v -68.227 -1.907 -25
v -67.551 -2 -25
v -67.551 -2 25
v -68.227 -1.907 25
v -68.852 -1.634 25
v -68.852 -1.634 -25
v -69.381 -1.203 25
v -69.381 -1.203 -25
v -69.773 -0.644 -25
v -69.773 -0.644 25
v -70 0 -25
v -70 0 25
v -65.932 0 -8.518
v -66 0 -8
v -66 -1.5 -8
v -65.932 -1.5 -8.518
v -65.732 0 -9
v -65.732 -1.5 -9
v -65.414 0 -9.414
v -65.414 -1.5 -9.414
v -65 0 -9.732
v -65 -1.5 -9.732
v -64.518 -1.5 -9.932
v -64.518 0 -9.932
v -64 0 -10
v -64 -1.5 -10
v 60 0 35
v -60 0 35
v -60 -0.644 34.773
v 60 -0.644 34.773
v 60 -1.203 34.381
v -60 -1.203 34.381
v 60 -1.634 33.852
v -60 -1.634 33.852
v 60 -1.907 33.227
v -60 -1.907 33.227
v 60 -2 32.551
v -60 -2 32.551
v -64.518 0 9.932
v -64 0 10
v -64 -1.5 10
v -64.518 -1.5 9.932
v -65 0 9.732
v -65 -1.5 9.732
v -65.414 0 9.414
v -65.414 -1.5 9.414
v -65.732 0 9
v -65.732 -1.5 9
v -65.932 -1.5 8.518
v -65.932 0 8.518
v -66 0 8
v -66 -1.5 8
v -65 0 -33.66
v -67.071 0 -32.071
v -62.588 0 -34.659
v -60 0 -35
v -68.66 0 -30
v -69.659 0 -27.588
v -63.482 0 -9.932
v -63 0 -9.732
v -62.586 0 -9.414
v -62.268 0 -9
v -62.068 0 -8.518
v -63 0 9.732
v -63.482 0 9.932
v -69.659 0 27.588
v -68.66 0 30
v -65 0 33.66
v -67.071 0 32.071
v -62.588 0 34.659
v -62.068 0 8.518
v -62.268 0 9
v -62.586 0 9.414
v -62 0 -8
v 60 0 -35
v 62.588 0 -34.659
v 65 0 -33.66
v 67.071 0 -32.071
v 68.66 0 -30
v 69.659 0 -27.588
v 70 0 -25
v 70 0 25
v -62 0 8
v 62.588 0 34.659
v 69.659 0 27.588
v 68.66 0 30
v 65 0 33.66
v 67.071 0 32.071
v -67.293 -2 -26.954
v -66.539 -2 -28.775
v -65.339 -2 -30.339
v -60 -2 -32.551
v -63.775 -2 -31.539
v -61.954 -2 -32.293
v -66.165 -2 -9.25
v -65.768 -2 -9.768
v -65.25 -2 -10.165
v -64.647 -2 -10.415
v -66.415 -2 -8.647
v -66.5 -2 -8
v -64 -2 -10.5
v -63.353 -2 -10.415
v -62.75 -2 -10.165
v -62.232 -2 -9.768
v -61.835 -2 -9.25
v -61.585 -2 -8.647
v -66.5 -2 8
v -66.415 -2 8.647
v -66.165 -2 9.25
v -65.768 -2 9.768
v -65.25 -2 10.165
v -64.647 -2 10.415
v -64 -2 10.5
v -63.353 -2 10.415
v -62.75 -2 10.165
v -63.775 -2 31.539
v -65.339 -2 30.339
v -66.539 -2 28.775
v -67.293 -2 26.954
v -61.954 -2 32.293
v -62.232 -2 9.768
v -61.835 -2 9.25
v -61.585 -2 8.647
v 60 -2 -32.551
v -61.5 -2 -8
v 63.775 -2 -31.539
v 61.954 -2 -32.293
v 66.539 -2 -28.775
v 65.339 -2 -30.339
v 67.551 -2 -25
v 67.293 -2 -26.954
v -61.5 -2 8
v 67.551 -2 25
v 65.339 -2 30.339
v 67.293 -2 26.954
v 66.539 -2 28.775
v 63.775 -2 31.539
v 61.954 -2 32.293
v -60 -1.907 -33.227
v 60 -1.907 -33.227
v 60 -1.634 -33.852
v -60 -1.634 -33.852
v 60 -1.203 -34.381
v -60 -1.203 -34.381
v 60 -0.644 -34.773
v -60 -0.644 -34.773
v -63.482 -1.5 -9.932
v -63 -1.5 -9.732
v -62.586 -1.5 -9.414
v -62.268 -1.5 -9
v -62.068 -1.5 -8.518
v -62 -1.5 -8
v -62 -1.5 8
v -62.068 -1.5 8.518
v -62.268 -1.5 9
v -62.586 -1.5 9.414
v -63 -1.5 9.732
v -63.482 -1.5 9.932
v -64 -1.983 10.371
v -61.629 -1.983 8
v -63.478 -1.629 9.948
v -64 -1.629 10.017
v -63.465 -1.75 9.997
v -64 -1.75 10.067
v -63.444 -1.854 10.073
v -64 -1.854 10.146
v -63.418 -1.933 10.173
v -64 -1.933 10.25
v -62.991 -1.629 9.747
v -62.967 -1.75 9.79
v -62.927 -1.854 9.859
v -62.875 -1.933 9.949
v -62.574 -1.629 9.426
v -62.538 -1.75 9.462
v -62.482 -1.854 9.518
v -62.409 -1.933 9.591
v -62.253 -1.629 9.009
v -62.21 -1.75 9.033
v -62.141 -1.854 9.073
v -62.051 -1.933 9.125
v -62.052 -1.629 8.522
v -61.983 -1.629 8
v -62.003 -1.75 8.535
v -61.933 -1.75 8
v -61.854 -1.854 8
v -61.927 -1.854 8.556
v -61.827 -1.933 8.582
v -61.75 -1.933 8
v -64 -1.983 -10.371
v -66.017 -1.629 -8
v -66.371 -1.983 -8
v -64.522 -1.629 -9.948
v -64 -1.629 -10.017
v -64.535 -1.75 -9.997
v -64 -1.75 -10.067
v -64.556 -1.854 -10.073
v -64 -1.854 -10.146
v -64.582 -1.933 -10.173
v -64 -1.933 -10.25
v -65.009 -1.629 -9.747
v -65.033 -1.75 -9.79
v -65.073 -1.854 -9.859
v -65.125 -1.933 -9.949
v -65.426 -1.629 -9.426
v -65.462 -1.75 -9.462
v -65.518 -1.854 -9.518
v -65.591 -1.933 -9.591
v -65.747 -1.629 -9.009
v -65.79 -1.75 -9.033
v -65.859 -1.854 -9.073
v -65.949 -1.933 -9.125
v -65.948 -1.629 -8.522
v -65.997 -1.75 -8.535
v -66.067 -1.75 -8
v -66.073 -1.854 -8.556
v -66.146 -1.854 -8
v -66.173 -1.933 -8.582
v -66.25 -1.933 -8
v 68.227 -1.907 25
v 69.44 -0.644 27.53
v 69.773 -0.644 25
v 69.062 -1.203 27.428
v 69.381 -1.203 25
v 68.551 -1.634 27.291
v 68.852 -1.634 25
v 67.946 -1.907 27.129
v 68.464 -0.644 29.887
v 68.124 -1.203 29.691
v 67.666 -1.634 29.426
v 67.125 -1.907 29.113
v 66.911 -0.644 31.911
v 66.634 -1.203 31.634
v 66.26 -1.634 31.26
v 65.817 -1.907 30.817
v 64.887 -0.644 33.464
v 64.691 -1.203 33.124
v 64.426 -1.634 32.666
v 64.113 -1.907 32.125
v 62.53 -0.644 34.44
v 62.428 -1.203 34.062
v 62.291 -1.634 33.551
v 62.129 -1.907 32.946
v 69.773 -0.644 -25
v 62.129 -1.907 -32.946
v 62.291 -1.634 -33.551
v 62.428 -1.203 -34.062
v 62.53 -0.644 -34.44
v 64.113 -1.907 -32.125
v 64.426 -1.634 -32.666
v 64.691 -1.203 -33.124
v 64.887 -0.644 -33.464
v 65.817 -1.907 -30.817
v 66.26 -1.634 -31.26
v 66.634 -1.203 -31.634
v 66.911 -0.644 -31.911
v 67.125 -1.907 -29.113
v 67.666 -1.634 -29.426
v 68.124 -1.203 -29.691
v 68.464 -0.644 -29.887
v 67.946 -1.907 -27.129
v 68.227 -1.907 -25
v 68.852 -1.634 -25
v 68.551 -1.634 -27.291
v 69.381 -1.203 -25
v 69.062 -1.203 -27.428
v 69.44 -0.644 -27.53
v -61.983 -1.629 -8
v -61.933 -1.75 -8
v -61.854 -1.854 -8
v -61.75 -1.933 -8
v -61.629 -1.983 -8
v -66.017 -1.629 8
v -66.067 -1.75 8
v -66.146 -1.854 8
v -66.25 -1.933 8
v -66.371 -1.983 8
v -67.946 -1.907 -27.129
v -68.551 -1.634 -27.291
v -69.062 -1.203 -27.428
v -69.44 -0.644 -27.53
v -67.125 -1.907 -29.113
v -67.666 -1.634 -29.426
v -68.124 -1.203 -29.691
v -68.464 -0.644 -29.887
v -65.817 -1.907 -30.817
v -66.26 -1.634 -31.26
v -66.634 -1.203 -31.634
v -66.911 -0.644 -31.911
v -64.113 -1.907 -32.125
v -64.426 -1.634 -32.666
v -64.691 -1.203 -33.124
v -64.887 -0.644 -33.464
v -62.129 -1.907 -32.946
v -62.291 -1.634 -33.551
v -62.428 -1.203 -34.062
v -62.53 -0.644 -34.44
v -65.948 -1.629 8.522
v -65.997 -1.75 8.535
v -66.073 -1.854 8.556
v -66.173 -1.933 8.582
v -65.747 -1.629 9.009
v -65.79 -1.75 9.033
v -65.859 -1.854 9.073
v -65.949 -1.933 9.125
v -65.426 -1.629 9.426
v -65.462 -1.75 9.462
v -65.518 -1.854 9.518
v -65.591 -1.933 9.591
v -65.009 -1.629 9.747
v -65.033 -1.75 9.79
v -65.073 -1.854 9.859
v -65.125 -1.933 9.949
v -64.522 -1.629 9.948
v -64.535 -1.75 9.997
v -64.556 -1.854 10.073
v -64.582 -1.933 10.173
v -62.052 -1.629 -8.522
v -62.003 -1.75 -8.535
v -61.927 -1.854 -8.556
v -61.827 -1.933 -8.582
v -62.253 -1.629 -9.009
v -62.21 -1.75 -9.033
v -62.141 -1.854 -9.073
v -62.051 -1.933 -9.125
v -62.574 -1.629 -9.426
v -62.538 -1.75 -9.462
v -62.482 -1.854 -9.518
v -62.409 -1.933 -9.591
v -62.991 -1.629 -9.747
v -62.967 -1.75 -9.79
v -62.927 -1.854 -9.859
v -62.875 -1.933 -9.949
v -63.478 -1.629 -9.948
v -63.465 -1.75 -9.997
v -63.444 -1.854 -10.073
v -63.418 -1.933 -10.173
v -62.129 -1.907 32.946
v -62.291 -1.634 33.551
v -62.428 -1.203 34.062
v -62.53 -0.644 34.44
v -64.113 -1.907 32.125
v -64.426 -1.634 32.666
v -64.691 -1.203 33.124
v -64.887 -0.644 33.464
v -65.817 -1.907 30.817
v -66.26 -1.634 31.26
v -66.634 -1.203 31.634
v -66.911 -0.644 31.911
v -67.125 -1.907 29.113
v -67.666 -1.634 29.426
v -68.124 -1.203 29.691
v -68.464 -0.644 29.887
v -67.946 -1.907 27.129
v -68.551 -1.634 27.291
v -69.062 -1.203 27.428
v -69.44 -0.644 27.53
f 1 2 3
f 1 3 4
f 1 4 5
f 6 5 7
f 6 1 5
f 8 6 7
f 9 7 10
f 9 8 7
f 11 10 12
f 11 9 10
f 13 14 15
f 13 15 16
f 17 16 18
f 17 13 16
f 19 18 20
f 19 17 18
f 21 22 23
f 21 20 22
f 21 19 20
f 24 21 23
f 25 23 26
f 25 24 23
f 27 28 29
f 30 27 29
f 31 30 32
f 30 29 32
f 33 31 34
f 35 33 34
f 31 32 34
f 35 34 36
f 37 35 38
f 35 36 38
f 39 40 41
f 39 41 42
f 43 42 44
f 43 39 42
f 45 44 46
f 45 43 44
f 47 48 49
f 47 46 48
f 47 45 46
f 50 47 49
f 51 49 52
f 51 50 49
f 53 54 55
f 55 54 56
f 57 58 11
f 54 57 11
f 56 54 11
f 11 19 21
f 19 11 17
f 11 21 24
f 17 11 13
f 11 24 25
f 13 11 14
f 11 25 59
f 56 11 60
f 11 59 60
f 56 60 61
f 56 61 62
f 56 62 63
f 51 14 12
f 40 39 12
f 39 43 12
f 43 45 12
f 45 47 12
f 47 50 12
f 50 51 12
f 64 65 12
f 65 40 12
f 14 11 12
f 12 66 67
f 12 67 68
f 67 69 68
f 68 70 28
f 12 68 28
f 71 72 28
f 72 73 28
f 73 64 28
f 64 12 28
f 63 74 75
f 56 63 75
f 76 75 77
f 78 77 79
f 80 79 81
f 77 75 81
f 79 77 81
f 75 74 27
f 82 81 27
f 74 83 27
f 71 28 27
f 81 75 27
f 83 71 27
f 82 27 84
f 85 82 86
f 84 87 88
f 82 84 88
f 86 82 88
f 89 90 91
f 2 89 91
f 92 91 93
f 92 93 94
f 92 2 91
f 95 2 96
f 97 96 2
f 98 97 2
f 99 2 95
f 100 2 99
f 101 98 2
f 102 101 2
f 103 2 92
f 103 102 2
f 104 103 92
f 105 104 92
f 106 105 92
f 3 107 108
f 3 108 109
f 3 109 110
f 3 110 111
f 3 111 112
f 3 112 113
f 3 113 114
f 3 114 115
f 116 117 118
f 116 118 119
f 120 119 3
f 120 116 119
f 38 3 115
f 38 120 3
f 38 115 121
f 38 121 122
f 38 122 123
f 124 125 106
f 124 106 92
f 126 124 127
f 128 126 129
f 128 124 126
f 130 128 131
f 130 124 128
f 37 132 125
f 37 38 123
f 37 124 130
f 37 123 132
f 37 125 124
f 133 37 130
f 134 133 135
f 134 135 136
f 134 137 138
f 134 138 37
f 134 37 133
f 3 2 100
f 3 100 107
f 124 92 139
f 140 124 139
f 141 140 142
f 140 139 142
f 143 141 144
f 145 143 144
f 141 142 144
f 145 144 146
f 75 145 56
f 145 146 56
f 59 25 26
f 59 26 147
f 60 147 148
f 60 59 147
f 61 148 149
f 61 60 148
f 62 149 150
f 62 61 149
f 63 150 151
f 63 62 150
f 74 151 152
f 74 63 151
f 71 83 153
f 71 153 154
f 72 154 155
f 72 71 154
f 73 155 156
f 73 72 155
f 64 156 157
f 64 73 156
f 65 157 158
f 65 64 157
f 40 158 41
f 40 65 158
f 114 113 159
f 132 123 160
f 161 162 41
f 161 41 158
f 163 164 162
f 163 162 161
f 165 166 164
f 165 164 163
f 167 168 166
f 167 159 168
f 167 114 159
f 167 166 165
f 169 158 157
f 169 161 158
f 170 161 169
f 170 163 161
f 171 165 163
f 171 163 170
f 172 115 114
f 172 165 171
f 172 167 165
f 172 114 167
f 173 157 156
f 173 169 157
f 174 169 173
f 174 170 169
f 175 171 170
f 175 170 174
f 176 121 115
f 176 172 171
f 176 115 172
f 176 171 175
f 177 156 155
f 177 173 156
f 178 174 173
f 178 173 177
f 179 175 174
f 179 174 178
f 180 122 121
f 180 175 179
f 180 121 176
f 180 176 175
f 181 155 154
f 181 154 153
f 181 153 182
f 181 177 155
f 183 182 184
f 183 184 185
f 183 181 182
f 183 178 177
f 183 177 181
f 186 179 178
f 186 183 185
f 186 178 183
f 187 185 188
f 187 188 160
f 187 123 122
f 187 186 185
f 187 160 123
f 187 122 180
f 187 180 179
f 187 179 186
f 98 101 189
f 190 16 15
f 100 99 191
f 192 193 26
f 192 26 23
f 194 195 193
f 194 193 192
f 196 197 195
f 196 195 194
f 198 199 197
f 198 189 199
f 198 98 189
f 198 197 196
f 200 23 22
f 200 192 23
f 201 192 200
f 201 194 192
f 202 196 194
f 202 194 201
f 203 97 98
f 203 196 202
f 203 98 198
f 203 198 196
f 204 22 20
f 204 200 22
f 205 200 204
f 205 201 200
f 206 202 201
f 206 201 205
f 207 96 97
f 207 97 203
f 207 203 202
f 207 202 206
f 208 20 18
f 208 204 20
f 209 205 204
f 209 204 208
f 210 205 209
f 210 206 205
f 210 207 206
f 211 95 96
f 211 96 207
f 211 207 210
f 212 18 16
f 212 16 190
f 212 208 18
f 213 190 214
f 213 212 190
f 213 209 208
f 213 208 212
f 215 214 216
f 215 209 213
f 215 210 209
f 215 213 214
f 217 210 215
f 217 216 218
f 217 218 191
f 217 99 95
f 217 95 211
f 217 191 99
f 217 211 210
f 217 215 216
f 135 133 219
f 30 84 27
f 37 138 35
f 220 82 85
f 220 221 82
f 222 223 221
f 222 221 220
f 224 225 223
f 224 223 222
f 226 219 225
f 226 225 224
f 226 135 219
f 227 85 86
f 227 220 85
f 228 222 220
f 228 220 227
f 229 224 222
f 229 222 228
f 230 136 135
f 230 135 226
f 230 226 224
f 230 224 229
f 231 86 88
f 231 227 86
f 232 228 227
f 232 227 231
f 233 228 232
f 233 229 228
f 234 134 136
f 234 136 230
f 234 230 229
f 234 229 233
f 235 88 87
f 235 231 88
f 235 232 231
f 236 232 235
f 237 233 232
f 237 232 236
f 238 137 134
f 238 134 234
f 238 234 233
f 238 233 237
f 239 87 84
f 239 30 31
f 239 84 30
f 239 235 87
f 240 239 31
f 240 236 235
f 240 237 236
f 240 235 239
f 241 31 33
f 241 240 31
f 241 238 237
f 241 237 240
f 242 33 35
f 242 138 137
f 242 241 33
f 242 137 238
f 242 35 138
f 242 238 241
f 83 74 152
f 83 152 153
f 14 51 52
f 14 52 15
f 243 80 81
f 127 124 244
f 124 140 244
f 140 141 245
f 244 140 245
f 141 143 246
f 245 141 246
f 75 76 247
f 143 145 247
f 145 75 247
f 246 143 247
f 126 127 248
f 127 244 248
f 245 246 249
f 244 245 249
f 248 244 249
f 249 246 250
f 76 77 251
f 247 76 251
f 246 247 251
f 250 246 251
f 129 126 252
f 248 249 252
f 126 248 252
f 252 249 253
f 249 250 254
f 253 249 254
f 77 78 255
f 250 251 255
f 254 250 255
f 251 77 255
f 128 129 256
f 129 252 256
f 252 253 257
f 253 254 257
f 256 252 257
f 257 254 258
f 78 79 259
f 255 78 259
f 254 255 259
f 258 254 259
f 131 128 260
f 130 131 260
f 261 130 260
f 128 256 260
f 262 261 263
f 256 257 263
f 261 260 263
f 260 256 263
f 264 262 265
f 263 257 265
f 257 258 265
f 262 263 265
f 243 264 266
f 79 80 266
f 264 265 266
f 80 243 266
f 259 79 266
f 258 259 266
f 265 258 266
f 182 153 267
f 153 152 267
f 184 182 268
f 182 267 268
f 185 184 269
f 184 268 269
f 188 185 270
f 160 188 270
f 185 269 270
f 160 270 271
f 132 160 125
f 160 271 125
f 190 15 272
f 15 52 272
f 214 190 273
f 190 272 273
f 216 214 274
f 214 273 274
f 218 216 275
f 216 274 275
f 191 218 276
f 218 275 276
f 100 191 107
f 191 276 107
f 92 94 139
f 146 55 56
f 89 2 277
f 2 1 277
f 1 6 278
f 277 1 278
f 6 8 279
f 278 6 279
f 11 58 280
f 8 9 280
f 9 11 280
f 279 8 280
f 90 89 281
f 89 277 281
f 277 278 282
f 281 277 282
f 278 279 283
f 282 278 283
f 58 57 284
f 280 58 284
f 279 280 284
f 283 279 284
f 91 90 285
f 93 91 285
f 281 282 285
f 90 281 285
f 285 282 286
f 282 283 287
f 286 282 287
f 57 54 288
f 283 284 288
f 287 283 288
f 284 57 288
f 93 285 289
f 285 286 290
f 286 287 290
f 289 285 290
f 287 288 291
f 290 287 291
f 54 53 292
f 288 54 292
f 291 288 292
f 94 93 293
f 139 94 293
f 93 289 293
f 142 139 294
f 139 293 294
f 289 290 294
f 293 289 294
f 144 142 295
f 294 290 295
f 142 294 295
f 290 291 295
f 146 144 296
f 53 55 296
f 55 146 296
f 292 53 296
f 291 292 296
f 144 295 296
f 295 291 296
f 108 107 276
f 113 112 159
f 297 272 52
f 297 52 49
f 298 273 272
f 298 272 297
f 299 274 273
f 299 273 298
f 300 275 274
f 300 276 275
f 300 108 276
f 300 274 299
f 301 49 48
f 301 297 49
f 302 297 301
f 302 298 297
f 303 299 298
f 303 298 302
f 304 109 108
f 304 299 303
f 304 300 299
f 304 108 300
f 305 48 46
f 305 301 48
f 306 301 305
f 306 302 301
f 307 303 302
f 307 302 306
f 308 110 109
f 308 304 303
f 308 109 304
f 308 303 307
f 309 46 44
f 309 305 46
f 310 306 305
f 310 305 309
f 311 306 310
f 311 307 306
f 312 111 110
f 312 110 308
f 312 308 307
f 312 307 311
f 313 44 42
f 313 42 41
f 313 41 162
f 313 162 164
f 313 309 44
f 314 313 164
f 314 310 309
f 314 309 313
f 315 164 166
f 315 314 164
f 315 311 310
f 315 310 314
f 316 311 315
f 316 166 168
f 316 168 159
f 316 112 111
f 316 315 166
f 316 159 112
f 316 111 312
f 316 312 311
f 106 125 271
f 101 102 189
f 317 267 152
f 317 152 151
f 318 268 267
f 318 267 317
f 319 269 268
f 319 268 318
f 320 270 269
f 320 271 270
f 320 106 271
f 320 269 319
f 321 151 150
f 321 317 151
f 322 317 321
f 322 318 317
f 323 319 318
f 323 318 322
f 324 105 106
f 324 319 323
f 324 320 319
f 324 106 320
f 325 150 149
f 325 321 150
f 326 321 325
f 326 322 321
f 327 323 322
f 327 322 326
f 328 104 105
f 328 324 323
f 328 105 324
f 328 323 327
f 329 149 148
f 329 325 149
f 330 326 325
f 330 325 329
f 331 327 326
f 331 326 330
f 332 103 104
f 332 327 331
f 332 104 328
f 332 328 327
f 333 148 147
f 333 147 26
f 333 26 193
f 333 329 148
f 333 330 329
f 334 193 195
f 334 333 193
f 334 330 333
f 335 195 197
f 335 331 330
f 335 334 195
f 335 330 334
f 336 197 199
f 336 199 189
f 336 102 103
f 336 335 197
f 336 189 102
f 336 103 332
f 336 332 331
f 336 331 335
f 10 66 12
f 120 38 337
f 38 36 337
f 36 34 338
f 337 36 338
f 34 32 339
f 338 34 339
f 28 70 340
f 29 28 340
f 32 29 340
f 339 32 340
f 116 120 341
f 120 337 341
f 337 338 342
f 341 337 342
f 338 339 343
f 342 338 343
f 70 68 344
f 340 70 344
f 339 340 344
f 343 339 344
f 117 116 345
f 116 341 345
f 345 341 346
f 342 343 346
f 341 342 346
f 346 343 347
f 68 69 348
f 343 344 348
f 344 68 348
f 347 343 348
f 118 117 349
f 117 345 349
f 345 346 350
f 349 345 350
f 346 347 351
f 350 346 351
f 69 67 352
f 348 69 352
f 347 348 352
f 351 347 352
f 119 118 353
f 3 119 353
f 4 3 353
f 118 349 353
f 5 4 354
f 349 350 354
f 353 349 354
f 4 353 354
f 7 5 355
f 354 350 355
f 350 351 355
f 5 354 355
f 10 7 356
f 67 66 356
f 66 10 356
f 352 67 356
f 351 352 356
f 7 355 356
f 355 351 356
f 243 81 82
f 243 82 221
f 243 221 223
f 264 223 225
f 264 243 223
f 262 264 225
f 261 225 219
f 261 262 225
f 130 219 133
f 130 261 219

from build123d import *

# Parameters (mm, degrees)
F1_DEPTH     = 2
F3_DEPTH     = 25
F4_T1_DEPTH  = 50
F4_T3_DEPTH  = 120
F4_T6_ANGLE  = 90
F4_T8_ANGLE  = 90
F4_T10_ANGLE = 90
F4_T12_ANGLE = 90
F5_R         = 0.5


# Not quite as in the source:
# - a fillet or chamfer that OpenCascade refuses, or shapes differently, is made with other operations: its cross-section is extruded or revolved along the edge and cut away or added


with BuildPart() as f1:
    # F0 (on Front) → F1 (new body)
    with BuildSketch(Plane.XZ):
        with BuildLine():
            ThreePointArc((70, 25), (67.0710678119, 32.0710678119), (60, 35))
            Line((60, 35), (-60, 35))
            ThreePointArc((-60, 35), (-67.0710678119, 32.0710678119), (-70, 25))
            Line((-70, 25), (-70, -25))
            ThreePointArc((-70, -25), (-67.0710678119, -32.0710678119), (-60, -35))
            Line((-60, -35), (60, -35))
            ThreePointArc((60, -35), (67.0710678119, -32.0710678119), (70, -25))
            Line((70, -25), (70, 25))
        make_face()
    extrude(amount=F1_DEPTH)

    # F2 (on Front) → F3 (cut)
    with BuildSketch(Plane.XZ):
        with BuildLine():
            Line((-62, -8), (-62, 8))
            ThreePointArc((-62, 8), (-62.5857864376, 9.4142135624), (-64, 10))
            ThreePointArc((-64, 10), (-65.4142135624, 9.4142135624), (-66, 8))
            Line((-66, 8), (-66, -8))
            ThreePointArc((-66, -8), (-65.4142135624, -9.4142135624), (-64, -10))
            ThreePointArc((-64, -10), (-62.5857864376, -9.4142135624), (-62, -8))
        make_face()
    extrude(amount=F3_DEPTH, mode=Mode.SUBTRACT)

    # F4: fillet of radius 2.5 on 1 edges, made by hand

    # F4_s2 → F4_t1 (cut)
    with BuildSketch(Plane.XY.offset(-25)):
        with BuildLine():
            ThreePointArc((-67.5505102572, -2), (-69.1316490873, -1.4364916731), (-70, 0))
            Line((-70, 0), (-70, -2))
            Line((-70, -2), (-67.5505102572, -2))
        make_face()
        with BuildLine():
            ThreePointArc((70, 0), (69.1316490873, -1.4364916731), (67.5505102572, -2))
            Line((67.5505102572, -2), (70, -2))
            Line((70, -2), (70, 0))
        make_face()
    extrude(amount=F4_T1_DEPTH, mode=Mode.SUBTRACT)

    # F4_s4 → F4_t3 (cut)
    with BuildSketch(Plane.YZ.offset(-60)):
        with BuildLine():
            ThreePointArc((-2, -32.5505102572), (-1.4364916731, -34.1316490873), (0, -35))
            Line((0, -35), (-2, -35))
            Line((-2, -35), (-2, -32.5505102572))
        make_face()
        with BuildLine():
            ThreePointArc((0, 35), (-1.4364916731, 34.1316490873), (-2, 32.5505102572))
            Line((-2, 32.5505102572), (-2, 35))
            Line((-2, 35), (0, 35))
        make_face()
    extrude(amount=F4_T3_DEPTH, mode=Mode.SUBTRACT)

    # F4_s5 → F4_t6 (revolve, cut)
    with BuildSketch(Plane.XY.offset(-25)):
        with BuildLine():
            ThreePointArc((-67.5505102572, -2), (-69.1316490873, -1.4364916731), (-70, 0))
            Line((-70, 0), (-70, -2))
            Line((-70, -2), (-67.5505102572, -2))
        make_face()
    revolve(axis=Axis((-60, -2, -25), (0, -1, 0)), revolution_arc=F4_T6_ANGLE, mode=Mode.SUBTRACT)

    # F4_s7 → F4_t8 (revolve, cut)
    with BuildSketch(Plane.YZ.offset(60)):
        with BuildLine():
            ThreePointArc((-2, -32.5505102572), (-1.4364916731, -34.1316490873), (0, -35))
            Line((0, -35), (-2, -35))
            Line((-2, -35), (-2, -32.5505102572))
        make_face()
    revolve(axis=Axis((60, -2, -25), (0, -1, 0)), revolution_arc=F4_T8_ANGLE, mode=Mode.SUBTRACT)

    # F4_s9 → F4_t10 (revolve, cut)
    with BuildSketch(Plane.XY.offset(25)):
        with BuildLine():
            ThreePointArc((70, 0), (69.1316490873, -1.4364916731), (67.5505102572, -2))
            Line((67.5505102572, -2), (70, -2))
            Line((70, -2), (70, 0))
        make_face()
    revolve(axis=Axis((60, -2, 25), (0, -1, 0)), revolution_arc=F4_T10_ANGLE, mode=Mode.SUBTRACT)

    # F4_s11 → F4_t12 (revolve, cut)
    with BuildSketch(Plane.YZ.offset(-60)):
        with BuildLine():
            ThreePointArc((-2, 32.5505102572), (-1.4364916731, 34.1316490873), (0, 35))
            Line((0, 35), (-2, 35))
            Line((-2, 35), (-2, 32.5505102572))
        make_face()
    revolve(axis=Axis((-60, -2, 25), (0, -1, 0)), revolution_arc=F4_T12_ANGLE, mode=Mode.SUBTRACT)

    # F5
    f5_edges = [f1.edges().sort_by_distance(p)[0] for p in [
        (-62, -2, 0),
        (-64, -2, 10),
        (-66, -2, 0),
        (-64, -2, -10),
    ]]
    fillet(f5_edges, radius=F5_R)


solid = f1.part
